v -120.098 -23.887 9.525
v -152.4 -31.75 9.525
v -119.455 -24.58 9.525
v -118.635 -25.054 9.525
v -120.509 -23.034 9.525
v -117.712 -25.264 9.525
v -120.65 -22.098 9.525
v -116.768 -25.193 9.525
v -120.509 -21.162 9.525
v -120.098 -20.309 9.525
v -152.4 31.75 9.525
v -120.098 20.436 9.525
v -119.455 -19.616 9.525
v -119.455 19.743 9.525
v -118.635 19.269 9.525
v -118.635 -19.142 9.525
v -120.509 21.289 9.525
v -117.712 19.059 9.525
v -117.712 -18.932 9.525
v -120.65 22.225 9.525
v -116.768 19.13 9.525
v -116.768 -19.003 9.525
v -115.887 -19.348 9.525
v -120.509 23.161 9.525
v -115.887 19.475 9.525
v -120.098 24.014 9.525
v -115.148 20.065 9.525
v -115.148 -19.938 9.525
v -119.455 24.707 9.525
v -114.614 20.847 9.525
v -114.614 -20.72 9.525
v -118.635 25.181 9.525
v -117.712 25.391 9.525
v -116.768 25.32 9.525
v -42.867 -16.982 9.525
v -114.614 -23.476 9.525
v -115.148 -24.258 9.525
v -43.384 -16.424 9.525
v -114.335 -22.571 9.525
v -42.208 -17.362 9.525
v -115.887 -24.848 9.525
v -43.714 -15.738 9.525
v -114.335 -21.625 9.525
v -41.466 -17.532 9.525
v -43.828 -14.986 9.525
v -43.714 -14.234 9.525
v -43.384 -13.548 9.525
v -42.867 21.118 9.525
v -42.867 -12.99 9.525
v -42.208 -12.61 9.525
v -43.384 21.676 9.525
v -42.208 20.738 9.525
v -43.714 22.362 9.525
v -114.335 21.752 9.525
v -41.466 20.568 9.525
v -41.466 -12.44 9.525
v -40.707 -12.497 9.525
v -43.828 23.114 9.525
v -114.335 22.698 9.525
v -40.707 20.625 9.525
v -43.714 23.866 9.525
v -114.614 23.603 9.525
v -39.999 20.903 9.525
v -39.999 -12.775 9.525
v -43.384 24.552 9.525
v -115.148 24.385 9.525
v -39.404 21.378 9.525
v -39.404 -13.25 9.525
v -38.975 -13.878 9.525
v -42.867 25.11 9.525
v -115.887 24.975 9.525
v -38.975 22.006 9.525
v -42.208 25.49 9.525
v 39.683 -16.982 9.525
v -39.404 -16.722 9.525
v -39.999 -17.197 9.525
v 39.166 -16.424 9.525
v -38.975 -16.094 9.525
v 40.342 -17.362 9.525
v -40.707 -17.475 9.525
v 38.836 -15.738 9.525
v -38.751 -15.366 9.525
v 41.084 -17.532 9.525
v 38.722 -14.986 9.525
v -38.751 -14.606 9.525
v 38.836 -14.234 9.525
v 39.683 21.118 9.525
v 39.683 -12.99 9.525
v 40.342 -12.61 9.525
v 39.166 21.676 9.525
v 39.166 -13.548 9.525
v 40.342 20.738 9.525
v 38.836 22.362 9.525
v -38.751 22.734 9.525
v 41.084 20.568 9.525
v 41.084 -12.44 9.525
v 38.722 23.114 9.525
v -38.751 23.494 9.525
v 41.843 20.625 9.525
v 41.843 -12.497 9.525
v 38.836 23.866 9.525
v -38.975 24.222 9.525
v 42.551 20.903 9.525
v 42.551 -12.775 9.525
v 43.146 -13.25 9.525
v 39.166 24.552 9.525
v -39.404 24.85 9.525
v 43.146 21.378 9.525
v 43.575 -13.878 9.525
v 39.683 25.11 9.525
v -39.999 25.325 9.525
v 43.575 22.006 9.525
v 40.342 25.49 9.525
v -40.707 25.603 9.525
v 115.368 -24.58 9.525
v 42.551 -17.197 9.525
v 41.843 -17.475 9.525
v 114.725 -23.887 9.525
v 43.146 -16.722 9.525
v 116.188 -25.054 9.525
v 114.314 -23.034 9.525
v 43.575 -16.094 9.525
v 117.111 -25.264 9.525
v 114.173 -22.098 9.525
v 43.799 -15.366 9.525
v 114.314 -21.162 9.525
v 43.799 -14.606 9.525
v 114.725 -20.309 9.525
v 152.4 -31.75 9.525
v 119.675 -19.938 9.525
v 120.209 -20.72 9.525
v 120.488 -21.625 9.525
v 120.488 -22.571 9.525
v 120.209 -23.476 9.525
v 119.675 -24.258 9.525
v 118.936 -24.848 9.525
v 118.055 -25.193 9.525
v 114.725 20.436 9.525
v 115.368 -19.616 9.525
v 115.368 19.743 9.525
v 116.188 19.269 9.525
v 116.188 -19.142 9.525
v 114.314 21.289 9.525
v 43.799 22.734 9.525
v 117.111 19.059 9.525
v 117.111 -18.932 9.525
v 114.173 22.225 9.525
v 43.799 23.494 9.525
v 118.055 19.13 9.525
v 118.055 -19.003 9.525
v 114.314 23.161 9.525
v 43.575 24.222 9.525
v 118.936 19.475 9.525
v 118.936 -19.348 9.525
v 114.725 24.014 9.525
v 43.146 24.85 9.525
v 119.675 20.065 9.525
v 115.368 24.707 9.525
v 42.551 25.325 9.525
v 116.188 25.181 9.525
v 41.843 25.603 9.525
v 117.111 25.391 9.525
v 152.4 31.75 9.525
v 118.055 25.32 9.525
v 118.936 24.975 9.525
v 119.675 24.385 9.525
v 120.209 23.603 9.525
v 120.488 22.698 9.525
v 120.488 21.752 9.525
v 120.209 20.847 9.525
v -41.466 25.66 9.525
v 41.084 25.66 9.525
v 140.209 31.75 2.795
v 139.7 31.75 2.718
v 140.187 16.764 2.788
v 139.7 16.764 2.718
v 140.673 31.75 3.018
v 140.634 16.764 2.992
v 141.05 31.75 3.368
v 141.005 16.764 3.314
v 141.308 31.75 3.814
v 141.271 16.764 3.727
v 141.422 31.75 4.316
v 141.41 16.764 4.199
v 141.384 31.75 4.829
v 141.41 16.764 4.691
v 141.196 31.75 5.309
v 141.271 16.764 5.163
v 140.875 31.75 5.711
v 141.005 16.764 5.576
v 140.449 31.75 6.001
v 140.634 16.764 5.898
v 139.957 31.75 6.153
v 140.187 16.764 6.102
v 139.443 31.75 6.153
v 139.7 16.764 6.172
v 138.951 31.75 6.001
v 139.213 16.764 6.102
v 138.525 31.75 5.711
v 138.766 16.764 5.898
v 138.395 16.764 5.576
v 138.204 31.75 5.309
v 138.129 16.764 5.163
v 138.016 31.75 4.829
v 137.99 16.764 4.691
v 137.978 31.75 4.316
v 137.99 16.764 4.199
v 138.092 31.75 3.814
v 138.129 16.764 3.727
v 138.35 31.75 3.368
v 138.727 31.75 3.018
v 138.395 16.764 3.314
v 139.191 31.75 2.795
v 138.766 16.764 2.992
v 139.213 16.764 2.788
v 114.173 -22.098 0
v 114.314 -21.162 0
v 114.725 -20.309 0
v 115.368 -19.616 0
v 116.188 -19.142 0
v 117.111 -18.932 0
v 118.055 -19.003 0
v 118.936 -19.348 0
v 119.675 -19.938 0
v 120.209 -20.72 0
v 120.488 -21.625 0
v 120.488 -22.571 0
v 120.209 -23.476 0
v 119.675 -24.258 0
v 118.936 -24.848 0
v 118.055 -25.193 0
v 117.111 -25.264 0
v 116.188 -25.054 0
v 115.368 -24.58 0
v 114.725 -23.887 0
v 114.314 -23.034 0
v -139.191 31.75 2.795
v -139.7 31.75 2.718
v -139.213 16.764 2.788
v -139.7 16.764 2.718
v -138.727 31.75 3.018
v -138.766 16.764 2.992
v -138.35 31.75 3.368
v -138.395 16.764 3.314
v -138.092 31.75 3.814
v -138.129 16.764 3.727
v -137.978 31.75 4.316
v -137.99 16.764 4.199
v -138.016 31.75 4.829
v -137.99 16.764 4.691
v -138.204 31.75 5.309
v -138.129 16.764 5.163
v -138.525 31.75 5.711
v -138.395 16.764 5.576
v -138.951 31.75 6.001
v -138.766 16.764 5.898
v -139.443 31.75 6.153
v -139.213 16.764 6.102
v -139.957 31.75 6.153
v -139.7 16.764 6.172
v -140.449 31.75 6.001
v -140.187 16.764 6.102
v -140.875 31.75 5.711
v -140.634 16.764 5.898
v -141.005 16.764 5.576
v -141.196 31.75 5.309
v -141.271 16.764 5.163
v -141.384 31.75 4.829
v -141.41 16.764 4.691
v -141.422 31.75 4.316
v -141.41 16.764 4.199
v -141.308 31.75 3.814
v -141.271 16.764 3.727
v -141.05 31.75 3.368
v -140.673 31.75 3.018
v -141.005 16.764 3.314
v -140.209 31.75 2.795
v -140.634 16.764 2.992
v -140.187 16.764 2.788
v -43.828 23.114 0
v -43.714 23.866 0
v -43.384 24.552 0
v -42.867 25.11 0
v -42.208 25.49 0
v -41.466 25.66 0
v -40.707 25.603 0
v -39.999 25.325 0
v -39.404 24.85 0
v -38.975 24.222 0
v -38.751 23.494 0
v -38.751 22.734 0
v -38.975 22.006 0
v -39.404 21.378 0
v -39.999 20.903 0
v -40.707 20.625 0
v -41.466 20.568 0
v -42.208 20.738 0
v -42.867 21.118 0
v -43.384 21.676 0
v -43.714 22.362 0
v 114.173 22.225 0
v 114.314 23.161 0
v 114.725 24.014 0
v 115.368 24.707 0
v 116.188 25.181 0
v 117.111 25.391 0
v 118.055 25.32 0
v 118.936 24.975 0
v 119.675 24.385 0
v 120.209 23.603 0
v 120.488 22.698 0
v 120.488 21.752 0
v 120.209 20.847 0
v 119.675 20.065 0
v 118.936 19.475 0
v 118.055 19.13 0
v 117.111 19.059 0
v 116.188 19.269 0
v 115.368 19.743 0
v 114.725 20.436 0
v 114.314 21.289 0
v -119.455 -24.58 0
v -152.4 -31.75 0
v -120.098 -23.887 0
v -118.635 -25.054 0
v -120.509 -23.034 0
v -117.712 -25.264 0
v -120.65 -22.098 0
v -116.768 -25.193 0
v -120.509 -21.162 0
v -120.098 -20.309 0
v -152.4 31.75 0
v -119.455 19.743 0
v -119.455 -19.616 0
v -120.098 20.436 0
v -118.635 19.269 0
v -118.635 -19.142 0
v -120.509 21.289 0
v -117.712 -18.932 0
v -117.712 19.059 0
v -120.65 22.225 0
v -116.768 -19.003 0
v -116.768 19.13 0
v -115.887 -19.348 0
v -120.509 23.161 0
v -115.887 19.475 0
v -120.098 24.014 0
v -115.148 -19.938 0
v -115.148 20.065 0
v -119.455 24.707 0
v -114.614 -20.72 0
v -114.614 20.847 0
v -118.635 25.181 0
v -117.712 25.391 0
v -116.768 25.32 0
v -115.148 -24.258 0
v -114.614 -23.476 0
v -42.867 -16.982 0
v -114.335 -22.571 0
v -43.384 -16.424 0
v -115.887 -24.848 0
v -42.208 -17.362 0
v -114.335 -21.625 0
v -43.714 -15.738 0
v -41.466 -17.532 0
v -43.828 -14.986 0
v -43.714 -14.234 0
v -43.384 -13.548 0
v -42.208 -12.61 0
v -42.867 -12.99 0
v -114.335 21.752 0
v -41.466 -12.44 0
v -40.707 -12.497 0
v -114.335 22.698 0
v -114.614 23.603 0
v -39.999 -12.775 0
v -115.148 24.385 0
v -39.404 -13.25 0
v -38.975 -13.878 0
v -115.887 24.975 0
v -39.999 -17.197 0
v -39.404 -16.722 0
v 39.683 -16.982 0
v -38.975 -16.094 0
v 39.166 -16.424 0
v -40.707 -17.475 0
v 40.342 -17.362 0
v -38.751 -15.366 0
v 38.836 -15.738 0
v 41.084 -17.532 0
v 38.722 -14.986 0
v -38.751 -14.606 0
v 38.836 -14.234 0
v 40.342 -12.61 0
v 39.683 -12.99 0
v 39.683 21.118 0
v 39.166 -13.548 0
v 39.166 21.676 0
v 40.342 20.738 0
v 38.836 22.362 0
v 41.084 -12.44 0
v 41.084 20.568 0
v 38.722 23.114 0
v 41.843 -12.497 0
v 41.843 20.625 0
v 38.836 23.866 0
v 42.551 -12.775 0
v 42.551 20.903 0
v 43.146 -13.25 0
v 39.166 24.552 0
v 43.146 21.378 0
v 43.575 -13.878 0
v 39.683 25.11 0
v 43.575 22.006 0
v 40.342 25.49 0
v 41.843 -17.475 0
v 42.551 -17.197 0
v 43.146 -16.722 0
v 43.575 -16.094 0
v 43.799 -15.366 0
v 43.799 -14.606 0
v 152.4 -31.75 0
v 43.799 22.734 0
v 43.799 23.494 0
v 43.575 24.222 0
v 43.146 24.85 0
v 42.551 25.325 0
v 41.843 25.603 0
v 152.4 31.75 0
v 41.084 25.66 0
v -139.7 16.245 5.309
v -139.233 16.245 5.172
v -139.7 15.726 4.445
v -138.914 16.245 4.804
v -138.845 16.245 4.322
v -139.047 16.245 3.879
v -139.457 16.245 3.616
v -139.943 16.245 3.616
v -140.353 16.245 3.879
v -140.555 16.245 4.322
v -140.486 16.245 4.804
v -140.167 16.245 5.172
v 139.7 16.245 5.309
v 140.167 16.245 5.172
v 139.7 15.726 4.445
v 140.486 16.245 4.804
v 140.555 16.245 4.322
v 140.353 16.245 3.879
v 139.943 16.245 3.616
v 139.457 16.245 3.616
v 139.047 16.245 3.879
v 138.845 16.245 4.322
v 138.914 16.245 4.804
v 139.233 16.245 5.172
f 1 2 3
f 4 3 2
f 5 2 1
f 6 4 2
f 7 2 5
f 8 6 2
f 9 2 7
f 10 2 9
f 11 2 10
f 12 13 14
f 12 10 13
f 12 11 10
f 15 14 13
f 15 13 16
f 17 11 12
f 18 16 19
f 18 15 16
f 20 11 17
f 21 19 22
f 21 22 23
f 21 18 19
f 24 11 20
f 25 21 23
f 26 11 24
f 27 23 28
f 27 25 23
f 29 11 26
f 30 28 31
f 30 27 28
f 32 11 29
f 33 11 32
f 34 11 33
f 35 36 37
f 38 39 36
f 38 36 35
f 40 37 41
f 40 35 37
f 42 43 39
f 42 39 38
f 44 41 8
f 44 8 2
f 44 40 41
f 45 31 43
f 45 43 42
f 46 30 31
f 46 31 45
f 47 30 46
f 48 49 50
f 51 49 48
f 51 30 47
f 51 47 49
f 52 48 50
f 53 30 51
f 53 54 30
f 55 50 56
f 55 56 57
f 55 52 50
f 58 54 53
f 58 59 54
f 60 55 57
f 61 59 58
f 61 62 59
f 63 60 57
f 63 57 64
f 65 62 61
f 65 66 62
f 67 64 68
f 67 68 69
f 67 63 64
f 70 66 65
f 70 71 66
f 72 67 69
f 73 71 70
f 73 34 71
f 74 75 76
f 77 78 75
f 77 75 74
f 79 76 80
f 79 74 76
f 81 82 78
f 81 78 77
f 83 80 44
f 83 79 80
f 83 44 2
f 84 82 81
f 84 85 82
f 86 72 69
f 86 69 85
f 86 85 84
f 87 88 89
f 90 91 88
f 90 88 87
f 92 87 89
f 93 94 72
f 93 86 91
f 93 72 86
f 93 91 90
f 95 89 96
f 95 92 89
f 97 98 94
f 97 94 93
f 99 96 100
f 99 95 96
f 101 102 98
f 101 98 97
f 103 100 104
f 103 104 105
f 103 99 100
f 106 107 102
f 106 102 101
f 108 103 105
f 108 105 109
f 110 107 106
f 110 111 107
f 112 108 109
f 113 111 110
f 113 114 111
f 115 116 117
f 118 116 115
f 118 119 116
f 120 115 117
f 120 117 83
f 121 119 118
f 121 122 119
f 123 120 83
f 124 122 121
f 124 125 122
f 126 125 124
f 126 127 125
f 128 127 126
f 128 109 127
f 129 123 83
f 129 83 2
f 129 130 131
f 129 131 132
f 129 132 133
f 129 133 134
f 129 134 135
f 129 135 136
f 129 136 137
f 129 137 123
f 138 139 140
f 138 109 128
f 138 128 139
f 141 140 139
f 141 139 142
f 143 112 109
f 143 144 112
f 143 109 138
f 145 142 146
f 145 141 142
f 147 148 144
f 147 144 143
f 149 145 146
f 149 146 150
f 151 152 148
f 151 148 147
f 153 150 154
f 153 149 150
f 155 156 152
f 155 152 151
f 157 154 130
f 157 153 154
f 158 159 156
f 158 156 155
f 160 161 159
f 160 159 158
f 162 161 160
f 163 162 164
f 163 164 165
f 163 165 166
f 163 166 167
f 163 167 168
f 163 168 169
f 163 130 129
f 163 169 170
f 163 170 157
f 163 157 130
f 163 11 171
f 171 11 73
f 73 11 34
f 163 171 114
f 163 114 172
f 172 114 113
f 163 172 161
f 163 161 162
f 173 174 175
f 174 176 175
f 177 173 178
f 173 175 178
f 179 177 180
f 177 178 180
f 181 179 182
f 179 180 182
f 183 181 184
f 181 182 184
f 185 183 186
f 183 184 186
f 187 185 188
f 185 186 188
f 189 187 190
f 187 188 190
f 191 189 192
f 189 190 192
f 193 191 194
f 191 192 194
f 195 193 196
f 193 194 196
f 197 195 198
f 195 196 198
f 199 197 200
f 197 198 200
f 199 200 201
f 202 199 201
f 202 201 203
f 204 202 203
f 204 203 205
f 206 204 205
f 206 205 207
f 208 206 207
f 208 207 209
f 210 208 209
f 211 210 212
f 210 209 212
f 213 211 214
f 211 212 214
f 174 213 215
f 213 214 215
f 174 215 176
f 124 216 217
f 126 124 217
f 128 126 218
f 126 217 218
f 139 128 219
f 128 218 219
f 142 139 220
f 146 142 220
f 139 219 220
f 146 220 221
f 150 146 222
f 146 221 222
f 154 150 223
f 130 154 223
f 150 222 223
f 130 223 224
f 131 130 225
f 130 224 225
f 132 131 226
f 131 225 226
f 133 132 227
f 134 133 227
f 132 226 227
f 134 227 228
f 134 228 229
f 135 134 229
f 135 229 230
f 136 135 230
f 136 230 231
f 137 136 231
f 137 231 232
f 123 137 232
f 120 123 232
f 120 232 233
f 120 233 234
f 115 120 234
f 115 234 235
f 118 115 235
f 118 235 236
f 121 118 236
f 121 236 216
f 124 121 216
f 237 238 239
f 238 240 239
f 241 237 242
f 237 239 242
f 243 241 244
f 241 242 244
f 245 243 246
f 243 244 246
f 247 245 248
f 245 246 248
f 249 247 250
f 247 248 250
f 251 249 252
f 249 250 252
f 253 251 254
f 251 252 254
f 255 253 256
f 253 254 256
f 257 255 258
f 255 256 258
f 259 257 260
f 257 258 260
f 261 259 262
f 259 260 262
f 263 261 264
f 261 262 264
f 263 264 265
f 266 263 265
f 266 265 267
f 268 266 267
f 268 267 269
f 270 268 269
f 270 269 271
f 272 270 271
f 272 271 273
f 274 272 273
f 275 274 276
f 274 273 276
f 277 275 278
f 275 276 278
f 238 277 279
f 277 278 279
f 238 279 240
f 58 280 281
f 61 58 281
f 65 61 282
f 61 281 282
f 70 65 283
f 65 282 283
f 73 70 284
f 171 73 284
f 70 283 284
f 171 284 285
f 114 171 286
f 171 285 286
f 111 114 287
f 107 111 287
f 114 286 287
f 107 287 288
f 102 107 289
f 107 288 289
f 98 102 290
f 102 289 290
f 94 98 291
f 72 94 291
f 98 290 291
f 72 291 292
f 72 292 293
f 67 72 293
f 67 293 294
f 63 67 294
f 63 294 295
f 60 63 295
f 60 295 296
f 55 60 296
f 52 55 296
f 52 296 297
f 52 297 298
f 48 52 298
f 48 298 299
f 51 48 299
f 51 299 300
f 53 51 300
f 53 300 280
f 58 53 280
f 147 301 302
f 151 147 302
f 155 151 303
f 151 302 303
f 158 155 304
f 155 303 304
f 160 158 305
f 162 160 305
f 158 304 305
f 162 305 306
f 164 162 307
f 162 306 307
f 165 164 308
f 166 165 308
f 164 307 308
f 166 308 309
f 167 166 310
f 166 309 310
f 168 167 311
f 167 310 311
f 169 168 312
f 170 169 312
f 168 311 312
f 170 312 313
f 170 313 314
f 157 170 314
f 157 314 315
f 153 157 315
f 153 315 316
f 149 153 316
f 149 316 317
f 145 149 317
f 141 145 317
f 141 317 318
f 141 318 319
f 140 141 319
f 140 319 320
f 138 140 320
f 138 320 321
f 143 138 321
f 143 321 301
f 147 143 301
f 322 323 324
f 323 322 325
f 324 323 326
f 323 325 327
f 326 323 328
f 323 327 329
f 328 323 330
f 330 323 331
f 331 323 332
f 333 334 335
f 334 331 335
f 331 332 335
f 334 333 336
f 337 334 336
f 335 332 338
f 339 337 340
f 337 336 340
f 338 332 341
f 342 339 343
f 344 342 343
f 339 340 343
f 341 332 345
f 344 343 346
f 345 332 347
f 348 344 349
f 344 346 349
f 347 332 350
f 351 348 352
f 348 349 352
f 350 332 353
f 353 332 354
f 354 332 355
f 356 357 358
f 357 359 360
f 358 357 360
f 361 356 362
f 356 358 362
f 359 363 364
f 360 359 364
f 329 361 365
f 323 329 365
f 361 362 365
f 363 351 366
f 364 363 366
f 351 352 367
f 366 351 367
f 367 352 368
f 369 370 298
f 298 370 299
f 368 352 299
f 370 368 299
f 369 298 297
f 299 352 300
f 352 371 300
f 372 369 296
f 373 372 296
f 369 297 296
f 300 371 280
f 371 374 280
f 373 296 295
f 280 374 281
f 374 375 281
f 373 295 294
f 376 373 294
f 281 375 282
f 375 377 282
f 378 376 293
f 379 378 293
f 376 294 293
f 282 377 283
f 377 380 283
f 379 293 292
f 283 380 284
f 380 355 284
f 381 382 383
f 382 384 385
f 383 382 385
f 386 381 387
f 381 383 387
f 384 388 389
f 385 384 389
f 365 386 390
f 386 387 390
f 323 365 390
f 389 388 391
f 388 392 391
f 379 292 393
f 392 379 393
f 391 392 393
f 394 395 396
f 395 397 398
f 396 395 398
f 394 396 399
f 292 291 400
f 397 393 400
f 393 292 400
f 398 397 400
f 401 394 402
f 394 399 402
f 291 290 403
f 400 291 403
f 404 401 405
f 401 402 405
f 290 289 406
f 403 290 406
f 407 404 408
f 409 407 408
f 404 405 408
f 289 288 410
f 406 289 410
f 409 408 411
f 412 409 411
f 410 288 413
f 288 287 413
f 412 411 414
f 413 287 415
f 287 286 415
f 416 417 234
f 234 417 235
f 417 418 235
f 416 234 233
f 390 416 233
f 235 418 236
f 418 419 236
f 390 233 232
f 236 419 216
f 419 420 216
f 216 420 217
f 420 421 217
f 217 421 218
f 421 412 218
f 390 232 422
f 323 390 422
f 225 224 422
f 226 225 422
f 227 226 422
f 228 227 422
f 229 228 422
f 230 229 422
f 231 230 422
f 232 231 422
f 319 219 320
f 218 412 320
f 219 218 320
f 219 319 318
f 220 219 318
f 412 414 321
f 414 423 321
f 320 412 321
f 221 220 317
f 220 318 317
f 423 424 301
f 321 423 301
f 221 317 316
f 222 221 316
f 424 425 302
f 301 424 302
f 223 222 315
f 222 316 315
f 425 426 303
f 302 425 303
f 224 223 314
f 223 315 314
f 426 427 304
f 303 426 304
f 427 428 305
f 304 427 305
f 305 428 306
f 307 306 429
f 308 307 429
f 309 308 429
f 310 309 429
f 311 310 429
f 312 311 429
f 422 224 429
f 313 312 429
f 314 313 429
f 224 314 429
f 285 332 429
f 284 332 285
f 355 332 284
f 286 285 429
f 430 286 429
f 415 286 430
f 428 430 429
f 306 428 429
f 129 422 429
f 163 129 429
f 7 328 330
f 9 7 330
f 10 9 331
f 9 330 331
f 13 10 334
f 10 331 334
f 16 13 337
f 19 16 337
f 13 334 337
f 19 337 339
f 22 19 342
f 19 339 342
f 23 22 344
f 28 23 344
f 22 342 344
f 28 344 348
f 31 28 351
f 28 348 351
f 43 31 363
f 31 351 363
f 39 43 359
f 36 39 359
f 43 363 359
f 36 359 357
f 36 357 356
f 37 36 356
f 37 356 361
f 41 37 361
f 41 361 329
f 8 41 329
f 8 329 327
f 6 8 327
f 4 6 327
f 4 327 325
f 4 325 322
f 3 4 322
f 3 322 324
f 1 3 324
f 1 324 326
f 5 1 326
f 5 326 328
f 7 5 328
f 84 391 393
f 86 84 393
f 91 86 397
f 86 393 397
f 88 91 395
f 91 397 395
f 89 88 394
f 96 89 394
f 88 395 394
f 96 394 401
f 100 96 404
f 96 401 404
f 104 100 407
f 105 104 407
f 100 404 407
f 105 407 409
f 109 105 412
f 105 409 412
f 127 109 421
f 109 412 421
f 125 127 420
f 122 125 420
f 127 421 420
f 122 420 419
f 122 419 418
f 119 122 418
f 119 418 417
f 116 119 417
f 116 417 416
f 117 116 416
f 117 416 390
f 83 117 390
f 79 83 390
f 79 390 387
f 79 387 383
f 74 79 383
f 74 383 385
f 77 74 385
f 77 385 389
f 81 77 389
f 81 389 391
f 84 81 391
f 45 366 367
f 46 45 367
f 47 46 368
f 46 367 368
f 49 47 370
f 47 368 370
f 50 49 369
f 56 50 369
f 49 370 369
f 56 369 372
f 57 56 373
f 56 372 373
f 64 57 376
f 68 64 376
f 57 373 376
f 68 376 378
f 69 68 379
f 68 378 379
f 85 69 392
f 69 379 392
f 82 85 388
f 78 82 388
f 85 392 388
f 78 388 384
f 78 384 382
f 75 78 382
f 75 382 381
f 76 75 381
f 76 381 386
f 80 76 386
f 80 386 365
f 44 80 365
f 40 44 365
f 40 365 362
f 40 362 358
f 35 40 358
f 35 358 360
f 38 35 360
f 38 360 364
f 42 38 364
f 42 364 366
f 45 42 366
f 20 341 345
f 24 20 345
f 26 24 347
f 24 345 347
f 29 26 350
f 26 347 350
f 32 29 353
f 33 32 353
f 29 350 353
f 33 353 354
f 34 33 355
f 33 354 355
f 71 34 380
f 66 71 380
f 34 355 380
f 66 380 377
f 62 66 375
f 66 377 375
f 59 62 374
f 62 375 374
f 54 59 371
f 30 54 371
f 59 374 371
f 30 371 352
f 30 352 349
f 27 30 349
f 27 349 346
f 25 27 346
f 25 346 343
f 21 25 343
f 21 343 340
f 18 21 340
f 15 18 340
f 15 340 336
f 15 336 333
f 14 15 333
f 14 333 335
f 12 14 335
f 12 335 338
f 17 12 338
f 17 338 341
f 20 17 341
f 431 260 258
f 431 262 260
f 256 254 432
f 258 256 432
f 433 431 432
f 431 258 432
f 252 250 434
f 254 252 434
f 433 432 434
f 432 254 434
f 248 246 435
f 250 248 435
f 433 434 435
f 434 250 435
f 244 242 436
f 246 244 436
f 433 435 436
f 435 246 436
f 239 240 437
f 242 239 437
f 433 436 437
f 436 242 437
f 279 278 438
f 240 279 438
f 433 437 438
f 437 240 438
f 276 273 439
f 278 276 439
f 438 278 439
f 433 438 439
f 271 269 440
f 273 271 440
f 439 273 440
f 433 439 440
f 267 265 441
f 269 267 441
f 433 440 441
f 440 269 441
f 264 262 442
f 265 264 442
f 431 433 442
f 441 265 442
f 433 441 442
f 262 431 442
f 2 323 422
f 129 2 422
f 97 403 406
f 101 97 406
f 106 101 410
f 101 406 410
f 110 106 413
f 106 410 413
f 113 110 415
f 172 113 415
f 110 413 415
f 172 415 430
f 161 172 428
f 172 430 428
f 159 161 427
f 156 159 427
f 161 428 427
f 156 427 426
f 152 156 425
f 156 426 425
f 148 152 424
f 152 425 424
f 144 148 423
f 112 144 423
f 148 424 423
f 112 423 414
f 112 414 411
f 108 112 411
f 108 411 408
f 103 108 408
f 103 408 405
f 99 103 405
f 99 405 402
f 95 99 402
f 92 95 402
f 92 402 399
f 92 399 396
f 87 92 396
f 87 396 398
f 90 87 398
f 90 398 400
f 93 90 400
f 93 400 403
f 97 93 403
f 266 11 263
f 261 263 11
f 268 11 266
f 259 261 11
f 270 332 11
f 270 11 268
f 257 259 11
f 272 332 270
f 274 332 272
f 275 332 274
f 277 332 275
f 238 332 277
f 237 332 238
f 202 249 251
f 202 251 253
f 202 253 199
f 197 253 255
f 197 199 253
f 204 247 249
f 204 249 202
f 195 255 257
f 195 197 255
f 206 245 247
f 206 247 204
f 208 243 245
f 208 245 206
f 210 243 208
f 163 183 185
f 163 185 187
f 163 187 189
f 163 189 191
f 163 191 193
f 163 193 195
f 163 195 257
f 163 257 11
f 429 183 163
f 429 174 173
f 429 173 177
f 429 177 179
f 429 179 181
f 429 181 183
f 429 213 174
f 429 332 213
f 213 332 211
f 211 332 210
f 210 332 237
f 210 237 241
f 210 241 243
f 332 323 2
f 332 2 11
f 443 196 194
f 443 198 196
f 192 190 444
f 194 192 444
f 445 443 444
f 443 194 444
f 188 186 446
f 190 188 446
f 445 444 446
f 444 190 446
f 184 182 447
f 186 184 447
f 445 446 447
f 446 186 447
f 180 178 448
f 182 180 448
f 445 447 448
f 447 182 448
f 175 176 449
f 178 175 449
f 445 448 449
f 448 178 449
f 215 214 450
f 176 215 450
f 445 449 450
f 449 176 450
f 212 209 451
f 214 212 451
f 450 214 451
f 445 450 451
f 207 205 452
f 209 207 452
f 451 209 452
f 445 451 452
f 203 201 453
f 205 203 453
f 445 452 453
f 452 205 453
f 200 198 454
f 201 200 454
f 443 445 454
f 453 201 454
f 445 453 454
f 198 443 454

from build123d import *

# Parameters (mm, degrees)
SKETCH1_W                   = 304.8
SKETCH1_H                   = 63.5
BOSS_EXTRUDE1_DEPTH         = 9.525
F_1_4_20_TAPPED_HOLE1_D     = 5.1054
F_1_4_0_25_DIAMETER_HOLE1_D = 6.35
F_8_32_TAPPED_HOLE1_D       = 3.4544
F_8_32_TAPPED_HOLE1_DEPTH   = 14.986
F_8_32_TAPPED_HOLE1_TIP     = 1.037806461


with BuildPart() as part:
    # Sketch1 → Boss-Extrude1 (new body)
    with BuildSketch(Plane.XY):
        Rectangle(SKETCH1_W, SKETCH1_H)
    extrude(amount=BOSS_EXTRUDE1_DEPTH)

    # 1/4-20 Tapped Hole1 (through all)
    with Locations(Plane(origin=(-41.275, 23.114, 9.525), x_dir=(1, 0, 0), z_dir=(0, 0, 1))):
        with Locations((0, 0), (82.55, 0), (82.55, -38.1), (0, -38.1)):
            Hole(F_1_4_20_TAPPED_HOLE1_D / 2)

    # 1/4 (0.25) Diameter Hole1 (through all)
    with Locations(Plane(origin=(-117.475, 22.225, 9.525), x_dir=(1, 0, 0), z_dir=(0, 0, 1))):
        with Locations((0, 0), (0, -44.323), (234.823, -44.323), (234.823, 0)):
            Hole(F_1_4_0_25_DIAMETER_HOLE1_D / 2)

    # #8-32 Tapped Hole1
    with Locations(Plane(origin=(-139.7, 31.75, 4.445), x_dir=(0, 0, 1), z_dir=(0, 1, 0))):
        with Locations((0, 0), (0, 279.4)):
            Hole(F_8_32_TAPPED_HOLE1_D / 2, depth=F_8_32_TAPPED_HOLE1_DEPTH)
            with Locations((0, 0, -(F_8_32_TAPPED_HOLE1_DEPTH + F_8_32_TAPPED_HOLE1_TIP / 2))):  # 118° drill point
                Cone(0, F_8_32_TAPPED_HOLE1_D / 2, F_8_32_TAPPED_HOLE1_TIP, mode=Mode.SUBTRACT)


solid = part.part
